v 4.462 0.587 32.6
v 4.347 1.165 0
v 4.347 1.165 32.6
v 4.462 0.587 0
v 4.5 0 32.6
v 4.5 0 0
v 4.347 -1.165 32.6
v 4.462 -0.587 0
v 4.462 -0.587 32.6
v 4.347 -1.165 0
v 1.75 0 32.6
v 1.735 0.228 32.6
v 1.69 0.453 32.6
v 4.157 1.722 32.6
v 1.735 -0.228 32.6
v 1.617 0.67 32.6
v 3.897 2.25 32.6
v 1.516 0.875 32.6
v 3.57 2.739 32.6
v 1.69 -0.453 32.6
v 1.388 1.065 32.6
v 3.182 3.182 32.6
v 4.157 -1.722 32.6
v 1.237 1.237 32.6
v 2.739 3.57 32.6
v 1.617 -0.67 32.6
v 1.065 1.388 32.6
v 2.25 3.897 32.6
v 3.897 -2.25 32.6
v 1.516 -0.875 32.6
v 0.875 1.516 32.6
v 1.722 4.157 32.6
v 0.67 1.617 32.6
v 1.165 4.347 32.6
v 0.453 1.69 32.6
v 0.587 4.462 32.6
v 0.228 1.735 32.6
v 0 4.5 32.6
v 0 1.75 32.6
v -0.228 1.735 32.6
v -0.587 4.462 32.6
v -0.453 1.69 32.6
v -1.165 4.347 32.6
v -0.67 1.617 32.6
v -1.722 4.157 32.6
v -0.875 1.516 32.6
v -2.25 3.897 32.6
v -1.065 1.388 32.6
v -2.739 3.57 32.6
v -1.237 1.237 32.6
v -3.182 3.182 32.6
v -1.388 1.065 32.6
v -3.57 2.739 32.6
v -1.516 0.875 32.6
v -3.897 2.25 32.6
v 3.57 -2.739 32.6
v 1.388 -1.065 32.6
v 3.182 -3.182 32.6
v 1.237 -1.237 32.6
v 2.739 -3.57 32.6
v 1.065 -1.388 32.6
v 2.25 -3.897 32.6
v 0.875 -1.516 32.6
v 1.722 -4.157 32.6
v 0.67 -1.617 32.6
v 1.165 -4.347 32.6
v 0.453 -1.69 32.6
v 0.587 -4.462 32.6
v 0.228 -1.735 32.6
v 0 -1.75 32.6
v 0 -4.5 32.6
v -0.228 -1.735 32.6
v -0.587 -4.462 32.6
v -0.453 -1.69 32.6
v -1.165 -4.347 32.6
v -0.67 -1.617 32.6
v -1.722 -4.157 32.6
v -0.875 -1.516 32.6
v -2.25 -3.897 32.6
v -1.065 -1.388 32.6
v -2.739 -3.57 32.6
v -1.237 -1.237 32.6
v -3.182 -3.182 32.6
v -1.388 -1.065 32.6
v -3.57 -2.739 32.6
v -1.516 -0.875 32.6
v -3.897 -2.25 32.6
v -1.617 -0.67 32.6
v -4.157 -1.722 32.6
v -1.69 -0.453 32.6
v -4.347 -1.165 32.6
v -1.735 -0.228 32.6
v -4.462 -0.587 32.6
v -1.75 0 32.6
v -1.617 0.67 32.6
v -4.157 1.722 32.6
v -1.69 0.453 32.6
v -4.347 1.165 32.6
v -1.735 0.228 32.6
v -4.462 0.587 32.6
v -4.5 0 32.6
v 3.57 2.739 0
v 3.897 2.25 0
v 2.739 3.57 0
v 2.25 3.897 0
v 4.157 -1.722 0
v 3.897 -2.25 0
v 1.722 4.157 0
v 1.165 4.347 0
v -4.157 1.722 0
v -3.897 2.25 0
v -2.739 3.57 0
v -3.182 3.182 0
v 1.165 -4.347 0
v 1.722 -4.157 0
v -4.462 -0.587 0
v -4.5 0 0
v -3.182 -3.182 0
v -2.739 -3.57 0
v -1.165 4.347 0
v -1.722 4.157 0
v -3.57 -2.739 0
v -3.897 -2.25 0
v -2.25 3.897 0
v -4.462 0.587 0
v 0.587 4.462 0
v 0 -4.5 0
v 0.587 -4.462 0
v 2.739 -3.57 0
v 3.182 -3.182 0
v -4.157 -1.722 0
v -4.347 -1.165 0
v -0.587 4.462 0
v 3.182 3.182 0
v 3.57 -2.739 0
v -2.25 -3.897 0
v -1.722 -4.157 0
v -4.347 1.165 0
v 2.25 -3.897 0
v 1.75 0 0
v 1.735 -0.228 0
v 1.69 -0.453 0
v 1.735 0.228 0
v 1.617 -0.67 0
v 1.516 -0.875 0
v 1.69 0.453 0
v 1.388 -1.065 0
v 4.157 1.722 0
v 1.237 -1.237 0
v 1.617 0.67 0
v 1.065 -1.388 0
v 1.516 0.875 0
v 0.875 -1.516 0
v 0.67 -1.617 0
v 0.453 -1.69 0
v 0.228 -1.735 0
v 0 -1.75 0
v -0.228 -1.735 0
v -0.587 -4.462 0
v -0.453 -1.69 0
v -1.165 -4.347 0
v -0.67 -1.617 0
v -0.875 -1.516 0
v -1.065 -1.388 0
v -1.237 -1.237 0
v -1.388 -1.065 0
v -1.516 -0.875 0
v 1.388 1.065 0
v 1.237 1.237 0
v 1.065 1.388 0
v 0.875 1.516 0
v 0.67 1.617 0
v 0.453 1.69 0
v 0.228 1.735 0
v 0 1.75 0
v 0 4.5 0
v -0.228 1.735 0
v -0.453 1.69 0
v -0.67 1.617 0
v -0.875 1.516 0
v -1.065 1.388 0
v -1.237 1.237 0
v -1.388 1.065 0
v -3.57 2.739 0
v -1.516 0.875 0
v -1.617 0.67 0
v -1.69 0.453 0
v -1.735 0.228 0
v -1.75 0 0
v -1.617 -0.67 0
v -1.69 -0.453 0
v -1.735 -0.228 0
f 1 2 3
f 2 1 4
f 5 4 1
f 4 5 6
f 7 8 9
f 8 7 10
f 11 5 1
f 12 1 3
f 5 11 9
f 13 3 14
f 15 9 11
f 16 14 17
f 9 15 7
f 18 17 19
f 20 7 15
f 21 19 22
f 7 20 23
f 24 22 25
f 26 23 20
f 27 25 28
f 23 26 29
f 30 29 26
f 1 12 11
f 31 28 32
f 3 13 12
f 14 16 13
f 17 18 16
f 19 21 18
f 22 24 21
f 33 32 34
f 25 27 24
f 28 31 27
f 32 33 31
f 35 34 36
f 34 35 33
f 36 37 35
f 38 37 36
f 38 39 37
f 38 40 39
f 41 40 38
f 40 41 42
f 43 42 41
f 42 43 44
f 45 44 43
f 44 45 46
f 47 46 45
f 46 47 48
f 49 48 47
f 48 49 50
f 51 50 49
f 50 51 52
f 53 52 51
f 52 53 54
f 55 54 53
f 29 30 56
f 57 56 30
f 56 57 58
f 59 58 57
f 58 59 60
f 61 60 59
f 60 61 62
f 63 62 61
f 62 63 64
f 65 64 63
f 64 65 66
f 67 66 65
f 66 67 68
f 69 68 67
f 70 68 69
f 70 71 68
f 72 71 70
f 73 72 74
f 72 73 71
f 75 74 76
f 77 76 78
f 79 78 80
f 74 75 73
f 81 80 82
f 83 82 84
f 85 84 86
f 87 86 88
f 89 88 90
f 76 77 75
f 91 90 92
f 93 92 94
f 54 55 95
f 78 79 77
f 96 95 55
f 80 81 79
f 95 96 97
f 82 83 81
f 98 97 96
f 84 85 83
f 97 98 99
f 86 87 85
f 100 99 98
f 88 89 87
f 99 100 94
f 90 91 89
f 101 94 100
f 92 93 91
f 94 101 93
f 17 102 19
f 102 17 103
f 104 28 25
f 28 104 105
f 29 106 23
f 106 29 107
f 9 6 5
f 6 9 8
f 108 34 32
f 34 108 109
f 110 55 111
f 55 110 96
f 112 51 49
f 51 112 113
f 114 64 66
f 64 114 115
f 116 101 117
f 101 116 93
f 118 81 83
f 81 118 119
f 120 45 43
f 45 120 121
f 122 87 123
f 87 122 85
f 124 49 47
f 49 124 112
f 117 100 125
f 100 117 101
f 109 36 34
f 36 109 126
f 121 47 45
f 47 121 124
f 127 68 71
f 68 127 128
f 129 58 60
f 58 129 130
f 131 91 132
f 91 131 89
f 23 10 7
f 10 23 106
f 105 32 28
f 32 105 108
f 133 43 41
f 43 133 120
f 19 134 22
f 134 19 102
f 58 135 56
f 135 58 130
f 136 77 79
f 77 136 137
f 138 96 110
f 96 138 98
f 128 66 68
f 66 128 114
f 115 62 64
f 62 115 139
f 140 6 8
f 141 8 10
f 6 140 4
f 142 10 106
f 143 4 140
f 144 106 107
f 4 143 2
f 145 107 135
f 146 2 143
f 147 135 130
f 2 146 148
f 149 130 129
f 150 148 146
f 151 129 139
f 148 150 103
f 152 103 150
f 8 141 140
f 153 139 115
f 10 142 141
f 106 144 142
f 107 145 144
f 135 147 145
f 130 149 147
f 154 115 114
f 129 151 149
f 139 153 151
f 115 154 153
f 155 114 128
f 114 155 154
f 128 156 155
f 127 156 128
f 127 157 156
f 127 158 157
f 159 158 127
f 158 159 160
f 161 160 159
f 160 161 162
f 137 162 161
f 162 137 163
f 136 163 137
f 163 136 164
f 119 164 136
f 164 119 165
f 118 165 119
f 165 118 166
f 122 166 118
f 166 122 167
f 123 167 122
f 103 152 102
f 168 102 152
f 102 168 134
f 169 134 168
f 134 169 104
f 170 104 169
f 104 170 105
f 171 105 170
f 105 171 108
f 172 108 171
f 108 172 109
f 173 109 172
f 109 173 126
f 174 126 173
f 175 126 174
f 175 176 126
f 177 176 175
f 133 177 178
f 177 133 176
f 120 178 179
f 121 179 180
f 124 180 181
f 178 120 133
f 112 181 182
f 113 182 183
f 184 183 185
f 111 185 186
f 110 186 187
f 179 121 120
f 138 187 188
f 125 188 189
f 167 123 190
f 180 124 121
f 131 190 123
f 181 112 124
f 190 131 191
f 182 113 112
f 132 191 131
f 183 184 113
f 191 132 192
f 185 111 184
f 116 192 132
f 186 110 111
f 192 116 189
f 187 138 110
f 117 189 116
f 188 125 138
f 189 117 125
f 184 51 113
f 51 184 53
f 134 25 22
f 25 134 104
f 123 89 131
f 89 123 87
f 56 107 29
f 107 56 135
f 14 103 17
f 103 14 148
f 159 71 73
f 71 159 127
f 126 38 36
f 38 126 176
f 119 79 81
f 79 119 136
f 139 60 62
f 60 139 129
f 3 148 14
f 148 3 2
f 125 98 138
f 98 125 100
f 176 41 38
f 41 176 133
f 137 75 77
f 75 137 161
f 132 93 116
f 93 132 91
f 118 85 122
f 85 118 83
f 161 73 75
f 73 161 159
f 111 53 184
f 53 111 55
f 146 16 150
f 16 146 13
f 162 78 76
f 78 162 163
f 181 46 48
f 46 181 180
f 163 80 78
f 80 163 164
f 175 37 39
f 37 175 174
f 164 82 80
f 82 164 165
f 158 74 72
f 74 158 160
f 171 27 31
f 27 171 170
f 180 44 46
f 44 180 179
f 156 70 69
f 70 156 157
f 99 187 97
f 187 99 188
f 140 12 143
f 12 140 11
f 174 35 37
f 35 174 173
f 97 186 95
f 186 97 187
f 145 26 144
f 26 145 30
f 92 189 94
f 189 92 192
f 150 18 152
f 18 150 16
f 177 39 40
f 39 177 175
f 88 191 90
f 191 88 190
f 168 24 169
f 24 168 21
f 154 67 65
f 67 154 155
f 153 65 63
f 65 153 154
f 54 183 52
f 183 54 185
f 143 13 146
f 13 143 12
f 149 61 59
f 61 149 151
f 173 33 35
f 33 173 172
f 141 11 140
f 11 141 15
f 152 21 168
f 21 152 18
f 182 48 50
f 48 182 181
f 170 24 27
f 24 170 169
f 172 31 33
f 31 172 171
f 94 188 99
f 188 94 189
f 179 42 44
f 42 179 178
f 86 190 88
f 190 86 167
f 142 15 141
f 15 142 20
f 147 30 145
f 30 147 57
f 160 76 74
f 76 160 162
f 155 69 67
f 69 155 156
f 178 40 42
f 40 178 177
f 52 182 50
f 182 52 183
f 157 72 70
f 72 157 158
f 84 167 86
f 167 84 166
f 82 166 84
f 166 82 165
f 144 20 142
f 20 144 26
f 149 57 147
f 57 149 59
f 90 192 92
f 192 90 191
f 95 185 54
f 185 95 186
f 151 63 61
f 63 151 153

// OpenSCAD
// file: parameters.scad
// =============================================================================
// Gen-BH — nightly 2026-10-04 (physics_scorer, honest magpylib watts)
// All 16 O20 magnets used as 8 double-height (10 mm) poles: 4-pole / 6-coil dual rotor on 3 mm steel, tall 9.9 mm copper; O5 assists left out because the scorer shows they do not help this pole layout.
// Clocking 0 deg (magnets N facing S) + D-flat keyed bore + index notch + flip-symmetric hole map.
// Windable 2-piece bobbin; turns = physics_scorer turns_fit; copper only between flanges.
// Steel back-iron: two 3.0 mm mild-steel discs (steel_backiron_disc.dxf); magnets sit ON the steel
// (through-pockets) -> score with --back-iron.
// =============================================================================
topology            = "dual_rotor";

// --- Wire / winding (physics_scorer winding-fit) -------------------------------
wire_awg            = 26;
wire_od             = 0.45;     // insulated OD mm (bare 0.405)
fill_realistic      = 0.60;     // insulated-wire area / window, hand-wound layered
turns               = 571;       // = physics_scorer turns_fit (do NOT raise)
coil_former_type    = "bobbin";
coil_core_inset     = 15.30;     // radial copper build: hub = copper boundary inset by this
wind_build_axial    = 0.0;      // nothing proud of the flanges
wind_build_radial   = 0.0;

// --- Bobbin (base + lid) ---------------------------------------------------------
coil_id_r           = 22.00;    // copper boundary sector
coil_od_r           = 62.00;
span_deg            = 50.35;    // = pitch - 2*asin((wall+0.85)/coil_id_r) -> >=1.2 mm stator web
former_web          = 9.90;     // copper height between flanges (TALL copper: steel keeps Bz up)
flange_t            = 0.80;     // >= 0.8 mm FDM wall rule (tall winds push on the flanges)
wall                = 1.00;     // flange lip beyond copper
former_bare_h       = former_web + 2 * flange_t;
coil_envelope_h     = former_bare_h + 2 * wind_build_axial;
tab_w               = 7.0;
tab_len             = 7.0;
tab_h               = former_bare_h / 2;
pin_d               = 1.9;      // 1.75 mm filament locating pin
coil_mount_r        = coil_od_r + 0.2 + 4.0;
lead_y              = 1.6;
lead_slot_w         = 0.9;
lead_groove_d       = 0.6;

// --- Gap -------------------------------------------------------------------------
run_clear           = 0.50;     // rotor face -> flange
gap_spacer_h        = run_clear + wind_build_axial;
m2m                 = coil_envelope_h + 2 * run_clear;   // rotor face to rotor face (= gap_sleeve length)

// --- Stator ----------------------------------------------------------------------
coil_stations       = 6;
bay_clear           = 0.25;
stator_thick        = former_bare_h;                        // bobbins flush both faces
stator_od           = 148.0;
shaft_clear_stator  = 14.0;     // stator is static; gap sleeve OD 12 spins inside

// --- Rotor(s) --------------------------------------------------------------------
magnet_Br           = 1.43;     // N52
magnet_d_large      = 20.0;
magnet_h_large      = 10.0;      // two O20x5 stacked per pocket
magnet_h_small      = 10.0;      // two O5x5 stacked per pocket
halbach_magnetisation = "none";  // NO O5 assist magnets in this kit (scorer: they do not help 4-pole)
rotor_b_same_axis   = true;     // same-index magnets share one axis: N faces S across the gap
large_pocket_d      = 20.3;
small_pocket_d      = 5.3;
pocket_h            = 10.10;     // THROUGH the carrier: magnet back face sits on the steel disc
large_n             = 4;
R_large             = 44.0;
small_r_list        = [];       // no O5 pockets
carrier_od          = 126.0;
carrier_thick       = pocket_h;
hub_h               = 10.0;
hub_od              = 24.0;     // slim hub so the M4 brace rods fit at R~18 inside the coil ring
hub_insert_d        = 4.0;      // M3 heat-set insert, radial, bears on the D-flat
rotor_b_offset_deg  = 0.0;      // CLOCKING: magnets directly opposite
shaft_key           = "dflat";
dflat_depth         = 0.5;      // 8 mm shaft with 0.5 mm flat (7.5 across flat)
index_notch_d       = 3.0;

// --- Steel back-iron (buyable laser-cut) -------------------------------------------
steel_t             = 3.0;      // mild steel thickness (not modelled by the image method; >=3 avoids saturation)
steel_center_hole   = 26.0;     // slips over the rotor hub (OD 24)

// --- Modular MAX interface ----------------------------------------------------------
shaft_bore          = 8.35;
dflat_x             = 4.0 - dflat_depth + (shaft_bore - 8.0) / 2;
bearing_d           = 21.85;
bearing_h           = 7.2;
m3_clear            = 3.5;
bolt_r_inner        = 27.0;     // M3 steel-disc clamp bolts (inside the magnet ring)
bolt_n_inner        = 4;
bolt_inner_angles   = [45, 135, 225, 315];
bolt_r_outer        = 58.0;     // M3 steel-disc clamp bolts (outside the magnet ring)
bolt_outer_angles   = [45, 135, 225, 315];
flange_bolt_r       = 69.0;     // frame rods: OUTSIDE the rotor OD (rotors spin inside them)
flange_bolt_n       = 6;
flange_bolt_offset  = 30.00;    // between coil stations -> never cuts a lead groove/tab
brace_r             = 17.5;
brace_d             = 4.3;      // temporary M4 jack rods (assembly only)
brace_n             = 4;
brace_angles        = [0, 90, 180, 270];          // flip-symmetric

spacer_pad_od       = 14.0;
spacer_pad_id       = m3_clear;
endbell_od          = 148.0;
endbell_thick       = 8.0;
endbell_shaft_clear = 10.0;
collar_h            = 10.0;
standoff_od         = 9.0;
frame_standoff_h    = run_clear + carrier_thick + hub_h + collar_h + 2.0;
sleeve_od           = 12.0;
plate_max_mm        = 410;

$fn = 64;
// main file
// Gen-BH — frame standoff tube between stator and an endbell, on each M3 frame rod (outside rotor OD).
// Print x12. Height = frame_standoff_h (rotor + steel + hub + collar + running clearance).
include <parameters.scad>;
$fn = 48;
difference() {
    cylinder(d=standoff_od, h=frame_standoff_h);
    translate([0, 0, -0.1]) cylinder(d=m3_clear, h=frame_standoff_h + 0.2);
}
